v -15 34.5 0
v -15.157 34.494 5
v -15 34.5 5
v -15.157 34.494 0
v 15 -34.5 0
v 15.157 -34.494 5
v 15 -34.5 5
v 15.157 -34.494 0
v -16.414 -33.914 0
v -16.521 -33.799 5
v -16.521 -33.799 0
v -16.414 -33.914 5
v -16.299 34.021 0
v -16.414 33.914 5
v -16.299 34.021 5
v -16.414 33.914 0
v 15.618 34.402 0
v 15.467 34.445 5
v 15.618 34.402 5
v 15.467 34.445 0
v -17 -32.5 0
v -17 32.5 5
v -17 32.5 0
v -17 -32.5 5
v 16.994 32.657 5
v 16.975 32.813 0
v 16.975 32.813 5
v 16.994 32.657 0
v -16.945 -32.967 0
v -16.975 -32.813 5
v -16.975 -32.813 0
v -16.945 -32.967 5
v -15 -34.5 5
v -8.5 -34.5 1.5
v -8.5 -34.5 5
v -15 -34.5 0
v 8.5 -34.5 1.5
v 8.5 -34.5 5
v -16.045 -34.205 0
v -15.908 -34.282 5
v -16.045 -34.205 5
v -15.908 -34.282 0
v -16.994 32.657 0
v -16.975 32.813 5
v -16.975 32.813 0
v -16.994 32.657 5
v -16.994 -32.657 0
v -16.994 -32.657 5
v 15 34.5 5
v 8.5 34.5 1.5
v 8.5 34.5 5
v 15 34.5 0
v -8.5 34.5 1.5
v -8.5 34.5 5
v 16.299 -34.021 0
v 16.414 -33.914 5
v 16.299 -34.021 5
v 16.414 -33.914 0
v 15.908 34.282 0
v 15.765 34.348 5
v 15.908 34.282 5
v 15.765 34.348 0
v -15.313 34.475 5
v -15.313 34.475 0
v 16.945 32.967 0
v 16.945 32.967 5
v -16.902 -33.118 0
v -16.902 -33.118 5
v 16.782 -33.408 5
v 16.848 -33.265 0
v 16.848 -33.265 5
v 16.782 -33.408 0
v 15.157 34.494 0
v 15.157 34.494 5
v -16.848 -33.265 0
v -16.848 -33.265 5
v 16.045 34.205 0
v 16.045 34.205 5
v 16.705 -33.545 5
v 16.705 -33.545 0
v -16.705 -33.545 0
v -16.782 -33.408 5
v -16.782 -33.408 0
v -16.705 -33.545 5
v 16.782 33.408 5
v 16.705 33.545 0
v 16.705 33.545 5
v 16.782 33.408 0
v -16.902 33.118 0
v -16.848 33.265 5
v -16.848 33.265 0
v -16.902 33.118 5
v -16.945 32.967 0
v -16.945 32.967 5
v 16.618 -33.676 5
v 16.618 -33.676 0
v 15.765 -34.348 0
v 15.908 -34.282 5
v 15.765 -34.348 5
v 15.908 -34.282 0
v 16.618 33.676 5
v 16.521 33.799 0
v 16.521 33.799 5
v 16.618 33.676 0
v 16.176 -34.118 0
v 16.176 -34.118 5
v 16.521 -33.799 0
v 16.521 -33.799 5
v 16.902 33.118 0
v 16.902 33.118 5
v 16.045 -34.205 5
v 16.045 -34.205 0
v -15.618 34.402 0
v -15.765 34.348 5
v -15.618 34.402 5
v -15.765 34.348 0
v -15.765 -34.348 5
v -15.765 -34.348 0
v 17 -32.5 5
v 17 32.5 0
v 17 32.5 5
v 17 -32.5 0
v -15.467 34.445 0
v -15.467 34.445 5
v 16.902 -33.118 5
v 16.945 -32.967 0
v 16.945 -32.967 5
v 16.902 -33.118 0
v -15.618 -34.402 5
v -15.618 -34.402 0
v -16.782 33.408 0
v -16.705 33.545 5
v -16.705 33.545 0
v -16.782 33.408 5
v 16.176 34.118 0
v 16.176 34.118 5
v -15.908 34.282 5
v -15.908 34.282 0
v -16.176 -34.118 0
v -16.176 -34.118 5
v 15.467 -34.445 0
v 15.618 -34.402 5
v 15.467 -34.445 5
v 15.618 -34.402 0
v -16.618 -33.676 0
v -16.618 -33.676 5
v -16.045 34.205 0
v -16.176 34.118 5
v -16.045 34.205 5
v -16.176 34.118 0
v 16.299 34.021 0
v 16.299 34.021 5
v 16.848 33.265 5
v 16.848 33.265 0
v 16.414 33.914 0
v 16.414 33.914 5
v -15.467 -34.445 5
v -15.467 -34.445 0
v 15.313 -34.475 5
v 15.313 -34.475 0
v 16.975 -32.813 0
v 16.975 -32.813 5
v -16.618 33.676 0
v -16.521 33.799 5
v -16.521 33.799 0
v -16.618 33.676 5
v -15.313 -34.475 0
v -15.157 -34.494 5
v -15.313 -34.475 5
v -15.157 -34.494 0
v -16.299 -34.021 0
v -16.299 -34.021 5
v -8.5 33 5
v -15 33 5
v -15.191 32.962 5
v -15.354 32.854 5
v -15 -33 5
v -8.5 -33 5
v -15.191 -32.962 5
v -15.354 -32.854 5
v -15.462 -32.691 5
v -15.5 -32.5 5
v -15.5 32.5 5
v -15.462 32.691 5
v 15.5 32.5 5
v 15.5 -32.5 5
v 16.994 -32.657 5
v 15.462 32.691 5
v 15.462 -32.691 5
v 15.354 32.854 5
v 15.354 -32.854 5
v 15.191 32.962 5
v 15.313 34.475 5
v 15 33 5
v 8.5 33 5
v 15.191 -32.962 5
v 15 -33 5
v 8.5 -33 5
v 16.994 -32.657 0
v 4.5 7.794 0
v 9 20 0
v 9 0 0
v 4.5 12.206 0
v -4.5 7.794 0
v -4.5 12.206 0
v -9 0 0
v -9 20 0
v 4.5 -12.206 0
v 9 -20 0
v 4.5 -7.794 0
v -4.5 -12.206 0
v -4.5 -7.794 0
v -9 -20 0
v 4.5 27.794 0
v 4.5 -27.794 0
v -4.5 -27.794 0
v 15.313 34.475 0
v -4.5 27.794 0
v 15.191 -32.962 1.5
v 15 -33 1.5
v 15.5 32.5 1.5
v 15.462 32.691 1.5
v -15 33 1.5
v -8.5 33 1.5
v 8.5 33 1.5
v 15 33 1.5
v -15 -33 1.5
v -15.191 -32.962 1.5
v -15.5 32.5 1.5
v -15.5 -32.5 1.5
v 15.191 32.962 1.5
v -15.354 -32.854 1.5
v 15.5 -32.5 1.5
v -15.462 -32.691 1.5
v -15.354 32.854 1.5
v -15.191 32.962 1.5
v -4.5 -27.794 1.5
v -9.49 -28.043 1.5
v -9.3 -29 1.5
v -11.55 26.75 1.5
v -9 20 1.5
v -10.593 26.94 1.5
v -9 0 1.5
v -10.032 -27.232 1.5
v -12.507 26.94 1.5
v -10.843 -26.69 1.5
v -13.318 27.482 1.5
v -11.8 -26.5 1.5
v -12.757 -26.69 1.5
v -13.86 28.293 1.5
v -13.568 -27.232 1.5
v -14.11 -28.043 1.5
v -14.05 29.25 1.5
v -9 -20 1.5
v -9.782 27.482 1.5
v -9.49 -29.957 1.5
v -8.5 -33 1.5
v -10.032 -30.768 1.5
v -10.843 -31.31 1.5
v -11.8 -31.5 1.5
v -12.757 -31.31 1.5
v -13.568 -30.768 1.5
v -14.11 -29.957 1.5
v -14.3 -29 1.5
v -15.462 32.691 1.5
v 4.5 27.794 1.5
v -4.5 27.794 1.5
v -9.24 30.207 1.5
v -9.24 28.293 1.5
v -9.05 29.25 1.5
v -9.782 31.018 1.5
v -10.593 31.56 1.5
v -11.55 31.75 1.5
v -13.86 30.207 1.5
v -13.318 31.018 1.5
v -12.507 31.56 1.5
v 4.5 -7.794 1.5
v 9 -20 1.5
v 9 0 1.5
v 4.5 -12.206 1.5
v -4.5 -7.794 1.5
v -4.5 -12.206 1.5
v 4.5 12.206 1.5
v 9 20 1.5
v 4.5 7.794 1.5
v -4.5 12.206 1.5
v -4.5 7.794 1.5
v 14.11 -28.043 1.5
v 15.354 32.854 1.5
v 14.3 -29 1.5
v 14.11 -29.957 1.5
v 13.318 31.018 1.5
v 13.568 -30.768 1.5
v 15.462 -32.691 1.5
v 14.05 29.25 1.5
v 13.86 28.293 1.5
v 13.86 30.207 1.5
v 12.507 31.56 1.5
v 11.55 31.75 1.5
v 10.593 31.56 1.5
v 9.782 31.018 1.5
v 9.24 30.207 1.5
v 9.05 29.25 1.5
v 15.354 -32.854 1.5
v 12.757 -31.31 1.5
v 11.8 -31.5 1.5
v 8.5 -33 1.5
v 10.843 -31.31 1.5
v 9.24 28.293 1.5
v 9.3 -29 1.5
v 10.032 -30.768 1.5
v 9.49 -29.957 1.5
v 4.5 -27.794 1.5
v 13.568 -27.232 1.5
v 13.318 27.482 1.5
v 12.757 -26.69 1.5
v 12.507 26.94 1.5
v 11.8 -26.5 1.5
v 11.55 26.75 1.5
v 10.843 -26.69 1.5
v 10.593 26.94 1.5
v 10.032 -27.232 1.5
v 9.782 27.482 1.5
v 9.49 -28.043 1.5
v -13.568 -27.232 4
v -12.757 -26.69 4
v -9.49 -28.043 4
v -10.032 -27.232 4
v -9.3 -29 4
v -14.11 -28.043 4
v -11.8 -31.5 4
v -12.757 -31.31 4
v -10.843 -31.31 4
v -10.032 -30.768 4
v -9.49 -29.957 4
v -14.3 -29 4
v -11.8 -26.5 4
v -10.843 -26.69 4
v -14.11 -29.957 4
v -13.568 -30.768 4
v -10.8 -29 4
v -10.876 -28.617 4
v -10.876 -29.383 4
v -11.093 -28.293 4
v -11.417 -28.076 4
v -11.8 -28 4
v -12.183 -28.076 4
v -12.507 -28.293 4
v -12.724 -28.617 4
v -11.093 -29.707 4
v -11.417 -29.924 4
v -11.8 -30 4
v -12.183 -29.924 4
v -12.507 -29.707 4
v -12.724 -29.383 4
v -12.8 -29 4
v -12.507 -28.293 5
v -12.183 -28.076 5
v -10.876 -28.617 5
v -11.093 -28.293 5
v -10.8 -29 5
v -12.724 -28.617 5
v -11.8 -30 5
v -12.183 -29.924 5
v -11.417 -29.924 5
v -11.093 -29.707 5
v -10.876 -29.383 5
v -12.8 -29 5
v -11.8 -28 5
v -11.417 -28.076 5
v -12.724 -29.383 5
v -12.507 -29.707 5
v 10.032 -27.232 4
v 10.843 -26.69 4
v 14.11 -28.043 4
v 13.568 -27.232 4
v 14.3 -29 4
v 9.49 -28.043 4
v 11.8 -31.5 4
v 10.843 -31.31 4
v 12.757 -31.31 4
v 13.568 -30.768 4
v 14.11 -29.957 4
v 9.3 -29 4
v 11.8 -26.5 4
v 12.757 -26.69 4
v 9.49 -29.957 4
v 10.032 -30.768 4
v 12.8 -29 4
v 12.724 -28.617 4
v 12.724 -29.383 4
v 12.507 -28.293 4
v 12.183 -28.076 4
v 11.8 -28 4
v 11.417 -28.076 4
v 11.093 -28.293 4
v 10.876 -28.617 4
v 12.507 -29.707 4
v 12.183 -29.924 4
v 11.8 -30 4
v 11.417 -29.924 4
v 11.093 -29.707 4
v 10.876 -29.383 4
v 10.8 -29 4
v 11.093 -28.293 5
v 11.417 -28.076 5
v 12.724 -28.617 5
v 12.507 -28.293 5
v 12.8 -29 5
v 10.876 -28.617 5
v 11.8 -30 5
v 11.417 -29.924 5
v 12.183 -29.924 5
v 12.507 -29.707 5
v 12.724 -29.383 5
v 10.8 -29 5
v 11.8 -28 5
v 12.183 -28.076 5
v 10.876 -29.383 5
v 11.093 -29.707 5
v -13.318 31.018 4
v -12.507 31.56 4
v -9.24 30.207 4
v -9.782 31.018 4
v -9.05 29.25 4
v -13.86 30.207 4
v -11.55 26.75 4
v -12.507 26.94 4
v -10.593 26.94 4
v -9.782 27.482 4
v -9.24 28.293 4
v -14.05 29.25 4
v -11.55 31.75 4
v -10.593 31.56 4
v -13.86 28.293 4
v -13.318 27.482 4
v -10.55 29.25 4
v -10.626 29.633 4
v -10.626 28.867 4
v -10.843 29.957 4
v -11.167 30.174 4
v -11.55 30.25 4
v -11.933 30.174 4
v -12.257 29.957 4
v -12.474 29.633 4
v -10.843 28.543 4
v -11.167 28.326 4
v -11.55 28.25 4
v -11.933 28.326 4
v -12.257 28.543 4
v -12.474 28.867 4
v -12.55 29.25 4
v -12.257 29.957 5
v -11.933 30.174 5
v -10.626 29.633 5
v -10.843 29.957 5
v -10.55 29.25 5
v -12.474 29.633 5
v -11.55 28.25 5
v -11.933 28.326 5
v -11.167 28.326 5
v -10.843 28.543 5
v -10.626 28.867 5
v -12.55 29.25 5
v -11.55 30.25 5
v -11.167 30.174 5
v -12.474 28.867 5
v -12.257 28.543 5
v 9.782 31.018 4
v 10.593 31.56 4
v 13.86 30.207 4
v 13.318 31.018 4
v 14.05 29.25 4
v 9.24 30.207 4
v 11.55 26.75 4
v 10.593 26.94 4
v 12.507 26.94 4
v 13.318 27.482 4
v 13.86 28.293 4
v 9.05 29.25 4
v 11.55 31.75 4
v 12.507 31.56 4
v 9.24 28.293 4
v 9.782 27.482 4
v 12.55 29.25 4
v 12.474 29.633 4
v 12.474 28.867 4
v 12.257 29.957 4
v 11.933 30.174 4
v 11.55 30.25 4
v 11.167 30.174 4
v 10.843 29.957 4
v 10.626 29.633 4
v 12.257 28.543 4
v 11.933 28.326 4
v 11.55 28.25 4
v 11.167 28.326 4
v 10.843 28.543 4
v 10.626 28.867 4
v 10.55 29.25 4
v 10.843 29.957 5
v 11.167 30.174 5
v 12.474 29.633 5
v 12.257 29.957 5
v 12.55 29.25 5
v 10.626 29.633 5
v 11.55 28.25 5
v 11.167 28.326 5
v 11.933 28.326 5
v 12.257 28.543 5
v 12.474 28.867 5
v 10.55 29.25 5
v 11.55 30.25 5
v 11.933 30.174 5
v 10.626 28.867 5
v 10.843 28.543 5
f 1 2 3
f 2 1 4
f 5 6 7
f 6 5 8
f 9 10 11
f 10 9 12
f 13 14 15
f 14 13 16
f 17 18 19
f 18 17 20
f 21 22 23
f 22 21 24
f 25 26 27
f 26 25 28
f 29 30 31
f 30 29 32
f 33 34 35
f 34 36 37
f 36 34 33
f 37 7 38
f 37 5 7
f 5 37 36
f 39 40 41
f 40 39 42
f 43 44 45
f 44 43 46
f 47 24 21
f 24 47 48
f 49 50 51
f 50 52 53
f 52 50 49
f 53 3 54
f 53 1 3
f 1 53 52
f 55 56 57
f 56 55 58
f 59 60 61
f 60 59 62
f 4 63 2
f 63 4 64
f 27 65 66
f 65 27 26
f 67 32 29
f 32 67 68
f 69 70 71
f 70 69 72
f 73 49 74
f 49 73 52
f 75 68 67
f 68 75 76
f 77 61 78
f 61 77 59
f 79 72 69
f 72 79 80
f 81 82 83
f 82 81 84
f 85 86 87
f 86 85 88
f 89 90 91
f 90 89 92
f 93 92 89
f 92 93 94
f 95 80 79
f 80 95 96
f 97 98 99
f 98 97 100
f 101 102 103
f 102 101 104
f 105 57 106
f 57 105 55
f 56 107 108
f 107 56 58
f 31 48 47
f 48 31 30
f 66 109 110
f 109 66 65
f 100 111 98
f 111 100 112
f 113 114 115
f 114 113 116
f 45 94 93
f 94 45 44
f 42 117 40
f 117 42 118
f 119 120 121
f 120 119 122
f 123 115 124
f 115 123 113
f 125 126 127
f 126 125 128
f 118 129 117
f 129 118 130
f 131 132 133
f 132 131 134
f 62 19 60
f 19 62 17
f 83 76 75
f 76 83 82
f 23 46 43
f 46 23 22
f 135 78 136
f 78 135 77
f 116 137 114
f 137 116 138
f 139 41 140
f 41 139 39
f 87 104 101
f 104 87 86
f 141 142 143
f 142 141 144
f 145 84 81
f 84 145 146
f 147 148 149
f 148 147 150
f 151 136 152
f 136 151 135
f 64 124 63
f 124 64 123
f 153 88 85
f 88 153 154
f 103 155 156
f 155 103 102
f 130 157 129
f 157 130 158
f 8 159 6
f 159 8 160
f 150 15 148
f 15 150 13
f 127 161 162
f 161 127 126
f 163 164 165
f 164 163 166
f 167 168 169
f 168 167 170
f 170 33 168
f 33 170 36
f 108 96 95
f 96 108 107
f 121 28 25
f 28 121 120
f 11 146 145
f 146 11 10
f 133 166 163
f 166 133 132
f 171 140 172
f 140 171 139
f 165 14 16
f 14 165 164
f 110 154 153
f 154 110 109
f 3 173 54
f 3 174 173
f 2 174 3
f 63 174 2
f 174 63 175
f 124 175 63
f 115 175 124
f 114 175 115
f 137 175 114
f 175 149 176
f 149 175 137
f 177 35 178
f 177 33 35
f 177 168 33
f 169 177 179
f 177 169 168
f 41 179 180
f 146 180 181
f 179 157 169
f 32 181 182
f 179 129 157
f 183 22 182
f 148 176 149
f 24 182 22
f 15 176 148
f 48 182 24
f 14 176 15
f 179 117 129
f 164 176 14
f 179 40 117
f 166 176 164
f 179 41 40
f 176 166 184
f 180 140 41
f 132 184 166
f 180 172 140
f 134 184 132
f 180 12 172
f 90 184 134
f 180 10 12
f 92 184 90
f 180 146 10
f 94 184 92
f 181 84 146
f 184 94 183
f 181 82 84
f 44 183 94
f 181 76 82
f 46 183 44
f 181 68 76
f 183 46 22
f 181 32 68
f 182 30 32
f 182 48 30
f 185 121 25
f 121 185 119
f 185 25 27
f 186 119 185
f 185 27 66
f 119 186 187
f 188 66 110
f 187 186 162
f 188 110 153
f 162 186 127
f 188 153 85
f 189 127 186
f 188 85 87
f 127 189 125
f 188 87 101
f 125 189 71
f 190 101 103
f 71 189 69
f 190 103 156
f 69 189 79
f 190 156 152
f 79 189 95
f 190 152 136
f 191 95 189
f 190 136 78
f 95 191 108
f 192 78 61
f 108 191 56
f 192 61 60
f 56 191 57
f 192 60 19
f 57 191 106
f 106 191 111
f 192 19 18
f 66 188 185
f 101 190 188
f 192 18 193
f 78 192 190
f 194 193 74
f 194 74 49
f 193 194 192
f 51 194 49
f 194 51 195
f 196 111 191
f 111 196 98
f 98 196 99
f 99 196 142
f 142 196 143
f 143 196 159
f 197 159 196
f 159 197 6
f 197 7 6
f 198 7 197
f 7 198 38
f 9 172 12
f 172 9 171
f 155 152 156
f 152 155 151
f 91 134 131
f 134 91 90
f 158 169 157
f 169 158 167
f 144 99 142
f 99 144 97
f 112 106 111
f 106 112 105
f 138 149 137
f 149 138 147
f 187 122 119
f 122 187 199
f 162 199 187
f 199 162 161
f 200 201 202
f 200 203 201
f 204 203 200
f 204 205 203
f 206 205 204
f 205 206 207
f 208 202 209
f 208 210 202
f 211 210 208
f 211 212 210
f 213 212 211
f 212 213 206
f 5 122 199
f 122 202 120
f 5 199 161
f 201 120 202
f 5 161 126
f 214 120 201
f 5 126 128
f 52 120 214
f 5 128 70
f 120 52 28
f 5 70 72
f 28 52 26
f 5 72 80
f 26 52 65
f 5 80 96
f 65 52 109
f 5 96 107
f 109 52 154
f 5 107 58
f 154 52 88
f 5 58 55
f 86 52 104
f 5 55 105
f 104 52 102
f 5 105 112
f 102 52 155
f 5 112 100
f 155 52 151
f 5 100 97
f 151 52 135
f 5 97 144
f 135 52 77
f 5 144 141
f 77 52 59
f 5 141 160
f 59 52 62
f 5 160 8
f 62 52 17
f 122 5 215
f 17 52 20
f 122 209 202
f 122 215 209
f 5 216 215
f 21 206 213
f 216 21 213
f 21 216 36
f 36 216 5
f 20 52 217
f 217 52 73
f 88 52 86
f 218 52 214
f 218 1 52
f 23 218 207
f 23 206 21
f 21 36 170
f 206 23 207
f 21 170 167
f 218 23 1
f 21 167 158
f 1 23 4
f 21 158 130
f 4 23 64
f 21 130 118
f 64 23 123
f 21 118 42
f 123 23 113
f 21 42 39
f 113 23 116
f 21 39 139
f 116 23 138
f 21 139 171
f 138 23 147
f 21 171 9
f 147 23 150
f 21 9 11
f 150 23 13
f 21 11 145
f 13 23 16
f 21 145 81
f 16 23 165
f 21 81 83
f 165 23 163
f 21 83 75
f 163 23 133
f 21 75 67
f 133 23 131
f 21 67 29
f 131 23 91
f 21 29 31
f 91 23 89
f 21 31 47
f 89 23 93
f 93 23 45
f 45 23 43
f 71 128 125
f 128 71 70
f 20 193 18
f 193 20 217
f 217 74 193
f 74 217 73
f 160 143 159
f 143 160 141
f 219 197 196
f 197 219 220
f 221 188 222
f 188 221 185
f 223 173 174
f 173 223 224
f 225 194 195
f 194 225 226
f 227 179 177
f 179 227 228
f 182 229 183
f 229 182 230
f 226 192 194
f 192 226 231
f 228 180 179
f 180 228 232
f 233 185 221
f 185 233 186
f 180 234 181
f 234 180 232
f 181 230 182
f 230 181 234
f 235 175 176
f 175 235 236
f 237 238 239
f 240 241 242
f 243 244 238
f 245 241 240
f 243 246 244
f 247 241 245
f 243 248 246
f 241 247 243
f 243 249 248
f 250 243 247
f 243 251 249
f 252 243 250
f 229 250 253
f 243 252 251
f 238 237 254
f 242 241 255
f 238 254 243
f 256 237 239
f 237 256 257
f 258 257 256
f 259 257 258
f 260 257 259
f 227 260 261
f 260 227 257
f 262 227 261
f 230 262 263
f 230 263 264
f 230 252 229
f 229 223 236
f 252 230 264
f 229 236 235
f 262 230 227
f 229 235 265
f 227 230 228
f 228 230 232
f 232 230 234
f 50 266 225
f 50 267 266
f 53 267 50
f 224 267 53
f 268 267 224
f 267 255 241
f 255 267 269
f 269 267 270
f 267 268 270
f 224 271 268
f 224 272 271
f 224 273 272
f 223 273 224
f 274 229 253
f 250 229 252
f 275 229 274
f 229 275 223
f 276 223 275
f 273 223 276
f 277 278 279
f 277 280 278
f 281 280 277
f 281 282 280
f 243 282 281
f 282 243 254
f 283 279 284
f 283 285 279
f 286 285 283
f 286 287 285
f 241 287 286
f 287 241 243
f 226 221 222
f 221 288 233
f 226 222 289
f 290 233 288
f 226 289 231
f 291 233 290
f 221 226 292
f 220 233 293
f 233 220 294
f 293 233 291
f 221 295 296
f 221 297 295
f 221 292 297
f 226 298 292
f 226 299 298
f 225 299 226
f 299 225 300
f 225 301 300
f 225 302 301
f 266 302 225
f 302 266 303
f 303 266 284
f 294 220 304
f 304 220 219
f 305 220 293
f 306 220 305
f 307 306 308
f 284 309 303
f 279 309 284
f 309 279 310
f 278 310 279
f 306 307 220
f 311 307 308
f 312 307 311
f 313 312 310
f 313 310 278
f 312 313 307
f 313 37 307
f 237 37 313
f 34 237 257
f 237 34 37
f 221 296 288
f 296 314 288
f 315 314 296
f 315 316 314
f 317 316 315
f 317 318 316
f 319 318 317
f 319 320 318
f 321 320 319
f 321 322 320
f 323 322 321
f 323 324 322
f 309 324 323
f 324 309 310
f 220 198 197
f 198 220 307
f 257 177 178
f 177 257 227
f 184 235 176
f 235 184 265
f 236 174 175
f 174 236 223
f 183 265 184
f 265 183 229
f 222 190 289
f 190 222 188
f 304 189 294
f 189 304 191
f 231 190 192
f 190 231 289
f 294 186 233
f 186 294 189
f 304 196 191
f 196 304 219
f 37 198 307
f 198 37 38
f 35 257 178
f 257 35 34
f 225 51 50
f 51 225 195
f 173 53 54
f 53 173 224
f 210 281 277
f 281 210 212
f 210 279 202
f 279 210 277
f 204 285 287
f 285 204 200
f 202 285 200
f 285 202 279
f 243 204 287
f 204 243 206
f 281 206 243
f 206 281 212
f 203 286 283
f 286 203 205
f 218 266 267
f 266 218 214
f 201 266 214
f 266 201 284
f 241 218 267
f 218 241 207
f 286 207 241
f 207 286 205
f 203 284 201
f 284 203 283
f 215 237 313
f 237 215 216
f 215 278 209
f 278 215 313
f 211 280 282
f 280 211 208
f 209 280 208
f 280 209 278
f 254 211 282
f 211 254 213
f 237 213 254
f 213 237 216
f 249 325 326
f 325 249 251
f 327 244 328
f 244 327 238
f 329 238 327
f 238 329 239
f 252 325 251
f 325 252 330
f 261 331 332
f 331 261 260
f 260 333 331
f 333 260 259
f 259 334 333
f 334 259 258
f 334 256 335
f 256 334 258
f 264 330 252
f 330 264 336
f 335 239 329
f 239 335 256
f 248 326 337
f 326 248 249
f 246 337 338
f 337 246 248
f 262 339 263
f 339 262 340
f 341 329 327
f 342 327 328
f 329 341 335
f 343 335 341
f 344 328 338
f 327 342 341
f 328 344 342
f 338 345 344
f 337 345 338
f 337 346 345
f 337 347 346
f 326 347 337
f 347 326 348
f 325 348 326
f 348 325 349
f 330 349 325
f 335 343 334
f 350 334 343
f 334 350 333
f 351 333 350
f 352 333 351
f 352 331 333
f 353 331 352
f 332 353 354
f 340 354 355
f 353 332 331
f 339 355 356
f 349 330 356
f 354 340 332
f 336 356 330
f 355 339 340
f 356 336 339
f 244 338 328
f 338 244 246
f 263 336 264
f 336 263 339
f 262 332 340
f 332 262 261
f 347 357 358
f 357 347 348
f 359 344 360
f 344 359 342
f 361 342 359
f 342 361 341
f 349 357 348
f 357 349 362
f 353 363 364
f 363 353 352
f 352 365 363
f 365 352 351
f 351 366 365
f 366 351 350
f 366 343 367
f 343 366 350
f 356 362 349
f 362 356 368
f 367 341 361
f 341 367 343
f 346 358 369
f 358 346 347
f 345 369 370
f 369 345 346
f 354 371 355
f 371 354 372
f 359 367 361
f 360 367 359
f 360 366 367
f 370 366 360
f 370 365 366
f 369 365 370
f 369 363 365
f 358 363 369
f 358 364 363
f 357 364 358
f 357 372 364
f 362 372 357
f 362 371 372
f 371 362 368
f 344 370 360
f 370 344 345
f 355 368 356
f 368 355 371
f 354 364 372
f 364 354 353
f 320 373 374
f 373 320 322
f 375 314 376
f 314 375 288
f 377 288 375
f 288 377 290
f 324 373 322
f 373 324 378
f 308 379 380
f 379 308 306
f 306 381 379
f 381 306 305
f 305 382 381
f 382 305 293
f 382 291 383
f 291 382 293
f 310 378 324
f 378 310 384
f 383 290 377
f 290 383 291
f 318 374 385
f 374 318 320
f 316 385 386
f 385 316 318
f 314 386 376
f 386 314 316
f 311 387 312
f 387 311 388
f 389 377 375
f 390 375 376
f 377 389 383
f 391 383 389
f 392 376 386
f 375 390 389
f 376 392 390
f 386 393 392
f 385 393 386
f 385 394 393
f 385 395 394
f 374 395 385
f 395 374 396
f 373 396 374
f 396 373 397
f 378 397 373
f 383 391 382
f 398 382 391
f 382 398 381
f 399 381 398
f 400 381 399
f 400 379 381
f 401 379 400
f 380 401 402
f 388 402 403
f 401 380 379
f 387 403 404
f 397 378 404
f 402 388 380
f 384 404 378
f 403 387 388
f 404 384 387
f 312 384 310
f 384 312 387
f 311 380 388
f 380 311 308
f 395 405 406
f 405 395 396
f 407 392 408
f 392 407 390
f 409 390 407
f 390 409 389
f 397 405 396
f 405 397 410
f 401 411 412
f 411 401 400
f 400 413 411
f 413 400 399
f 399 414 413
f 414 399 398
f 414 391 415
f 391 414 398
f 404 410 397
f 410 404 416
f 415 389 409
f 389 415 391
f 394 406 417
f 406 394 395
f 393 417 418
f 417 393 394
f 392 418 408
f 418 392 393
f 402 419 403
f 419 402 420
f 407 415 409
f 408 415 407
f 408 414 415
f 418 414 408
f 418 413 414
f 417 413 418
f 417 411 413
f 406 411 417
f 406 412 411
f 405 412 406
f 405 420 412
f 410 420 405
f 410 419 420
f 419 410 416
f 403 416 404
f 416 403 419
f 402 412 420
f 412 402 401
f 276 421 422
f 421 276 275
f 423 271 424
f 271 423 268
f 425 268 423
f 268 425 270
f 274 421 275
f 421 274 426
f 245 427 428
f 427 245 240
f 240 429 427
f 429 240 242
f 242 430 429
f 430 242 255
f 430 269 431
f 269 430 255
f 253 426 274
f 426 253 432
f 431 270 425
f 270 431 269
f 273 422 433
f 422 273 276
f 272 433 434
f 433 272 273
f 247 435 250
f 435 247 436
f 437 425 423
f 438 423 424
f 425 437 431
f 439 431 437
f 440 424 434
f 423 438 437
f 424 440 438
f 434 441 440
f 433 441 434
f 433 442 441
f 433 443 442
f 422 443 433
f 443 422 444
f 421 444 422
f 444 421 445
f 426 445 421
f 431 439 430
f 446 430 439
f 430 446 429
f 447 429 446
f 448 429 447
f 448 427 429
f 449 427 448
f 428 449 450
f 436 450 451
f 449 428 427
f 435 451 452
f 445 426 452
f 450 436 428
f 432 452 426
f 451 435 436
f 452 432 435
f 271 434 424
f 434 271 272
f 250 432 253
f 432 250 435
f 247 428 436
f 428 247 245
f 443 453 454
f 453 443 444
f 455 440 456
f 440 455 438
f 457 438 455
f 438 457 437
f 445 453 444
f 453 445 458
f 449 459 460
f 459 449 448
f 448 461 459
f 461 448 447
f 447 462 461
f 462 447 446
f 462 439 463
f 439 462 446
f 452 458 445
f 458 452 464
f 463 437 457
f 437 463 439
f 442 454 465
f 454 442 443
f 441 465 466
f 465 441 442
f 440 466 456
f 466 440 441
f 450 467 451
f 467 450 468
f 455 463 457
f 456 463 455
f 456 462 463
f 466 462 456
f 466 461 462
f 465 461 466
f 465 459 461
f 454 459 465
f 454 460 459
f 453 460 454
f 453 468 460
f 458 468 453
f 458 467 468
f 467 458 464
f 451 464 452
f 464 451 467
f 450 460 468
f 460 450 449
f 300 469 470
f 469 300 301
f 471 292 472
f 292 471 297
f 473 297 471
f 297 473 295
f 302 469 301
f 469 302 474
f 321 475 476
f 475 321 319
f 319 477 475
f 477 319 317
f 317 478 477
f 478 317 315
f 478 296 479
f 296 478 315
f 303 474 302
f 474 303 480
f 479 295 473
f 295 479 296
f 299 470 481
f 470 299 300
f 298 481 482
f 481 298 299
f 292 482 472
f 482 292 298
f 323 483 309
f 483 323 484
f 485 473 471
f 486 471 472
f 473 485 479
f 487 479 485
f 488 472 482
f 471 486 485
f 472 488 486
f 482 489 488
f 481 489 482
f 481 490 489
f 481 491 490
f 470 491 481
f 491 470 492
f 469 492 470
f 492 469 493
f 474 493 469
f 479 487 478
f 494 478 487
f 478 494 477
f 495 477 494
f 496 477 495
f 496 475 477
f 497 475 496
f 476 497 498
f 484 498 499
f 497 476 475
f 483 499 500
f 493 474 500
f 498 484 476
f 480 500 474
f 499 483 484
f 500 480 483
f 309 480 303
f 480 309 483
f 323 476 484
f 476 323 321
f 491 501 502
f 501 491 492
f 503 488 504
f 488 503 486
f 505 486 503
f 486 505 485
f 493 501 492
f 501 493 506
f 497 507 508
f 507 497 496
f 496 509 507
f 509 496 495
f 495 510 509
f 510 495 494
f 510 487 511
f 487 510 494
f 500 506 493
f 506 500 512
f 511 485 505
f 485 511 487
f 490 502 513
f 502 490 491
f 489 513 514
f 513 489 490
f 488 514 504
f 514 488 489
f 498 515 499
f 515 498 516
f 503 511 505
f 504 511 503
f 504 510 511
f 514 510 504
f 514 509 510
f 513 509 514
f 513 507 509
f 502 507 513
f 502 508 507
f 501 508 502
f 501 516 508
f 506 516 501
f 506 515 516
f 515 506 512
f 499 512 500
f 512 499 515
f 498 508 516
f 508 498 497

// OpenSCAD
// pibase.scad
// This is the back for the pi zero



module pibase(){
    
// base borrowed from pieye
difference(){
    color("yellow")
    linear_extrude(height=5)
    offset(r=2,$fn=80)    
    square(size=[30,65],center=true);

    translate([0,0,1.5])
    color("orange")
    linear_extrude(height=5)
    offset(r=0.5,$fn=16)    
    square(size=[30,65],center=true);

    translate([-8.5,-36,1.5])
    color("red")
    cube([17,5,5]);

    translate([-8.5,30,1.5])
    color("red")
    cube([17,5,5]);

    translate([-14,30,12])
    color("green")
    cube([28,5,5]);

    translate([0,0,-1])
    cylinder(r=9,h=5,$fn=6);
    translate([0,20,-1])
    cylinder(r=9,h=5,$fn=6);
    translate([0,-20,-1])
    cylinder(r=9,h=5,$fn=6);


}

// posts to support PCB
color("pink")
translate([-15+3.2,-32.0+3,1]){
    cylinder(r=2.5,h=3,$fn=16);
    cylinder(r=1,h=4,$fn=16);
}
color("pink")
translate([15-3.2,-32.0+3,1]){
    cylinder(r=2.5,h=3,$fn=16);
    cylinder(r=1,h=4,$fn=16);
}
translate([-14.75+3.2,32.25-3,1]){
    cylinder(r=2.5,h=3,$fn=16);
    cylinder(r=1,h=4,$fn=16);
}
translate([14.75-3.2,32.25-3,1]){
    cylinder(r=2.5,h=3,$fn=16);
    cylinder(r=1,h=4,$fn=16);
}

} // end module pibase

pibase();
